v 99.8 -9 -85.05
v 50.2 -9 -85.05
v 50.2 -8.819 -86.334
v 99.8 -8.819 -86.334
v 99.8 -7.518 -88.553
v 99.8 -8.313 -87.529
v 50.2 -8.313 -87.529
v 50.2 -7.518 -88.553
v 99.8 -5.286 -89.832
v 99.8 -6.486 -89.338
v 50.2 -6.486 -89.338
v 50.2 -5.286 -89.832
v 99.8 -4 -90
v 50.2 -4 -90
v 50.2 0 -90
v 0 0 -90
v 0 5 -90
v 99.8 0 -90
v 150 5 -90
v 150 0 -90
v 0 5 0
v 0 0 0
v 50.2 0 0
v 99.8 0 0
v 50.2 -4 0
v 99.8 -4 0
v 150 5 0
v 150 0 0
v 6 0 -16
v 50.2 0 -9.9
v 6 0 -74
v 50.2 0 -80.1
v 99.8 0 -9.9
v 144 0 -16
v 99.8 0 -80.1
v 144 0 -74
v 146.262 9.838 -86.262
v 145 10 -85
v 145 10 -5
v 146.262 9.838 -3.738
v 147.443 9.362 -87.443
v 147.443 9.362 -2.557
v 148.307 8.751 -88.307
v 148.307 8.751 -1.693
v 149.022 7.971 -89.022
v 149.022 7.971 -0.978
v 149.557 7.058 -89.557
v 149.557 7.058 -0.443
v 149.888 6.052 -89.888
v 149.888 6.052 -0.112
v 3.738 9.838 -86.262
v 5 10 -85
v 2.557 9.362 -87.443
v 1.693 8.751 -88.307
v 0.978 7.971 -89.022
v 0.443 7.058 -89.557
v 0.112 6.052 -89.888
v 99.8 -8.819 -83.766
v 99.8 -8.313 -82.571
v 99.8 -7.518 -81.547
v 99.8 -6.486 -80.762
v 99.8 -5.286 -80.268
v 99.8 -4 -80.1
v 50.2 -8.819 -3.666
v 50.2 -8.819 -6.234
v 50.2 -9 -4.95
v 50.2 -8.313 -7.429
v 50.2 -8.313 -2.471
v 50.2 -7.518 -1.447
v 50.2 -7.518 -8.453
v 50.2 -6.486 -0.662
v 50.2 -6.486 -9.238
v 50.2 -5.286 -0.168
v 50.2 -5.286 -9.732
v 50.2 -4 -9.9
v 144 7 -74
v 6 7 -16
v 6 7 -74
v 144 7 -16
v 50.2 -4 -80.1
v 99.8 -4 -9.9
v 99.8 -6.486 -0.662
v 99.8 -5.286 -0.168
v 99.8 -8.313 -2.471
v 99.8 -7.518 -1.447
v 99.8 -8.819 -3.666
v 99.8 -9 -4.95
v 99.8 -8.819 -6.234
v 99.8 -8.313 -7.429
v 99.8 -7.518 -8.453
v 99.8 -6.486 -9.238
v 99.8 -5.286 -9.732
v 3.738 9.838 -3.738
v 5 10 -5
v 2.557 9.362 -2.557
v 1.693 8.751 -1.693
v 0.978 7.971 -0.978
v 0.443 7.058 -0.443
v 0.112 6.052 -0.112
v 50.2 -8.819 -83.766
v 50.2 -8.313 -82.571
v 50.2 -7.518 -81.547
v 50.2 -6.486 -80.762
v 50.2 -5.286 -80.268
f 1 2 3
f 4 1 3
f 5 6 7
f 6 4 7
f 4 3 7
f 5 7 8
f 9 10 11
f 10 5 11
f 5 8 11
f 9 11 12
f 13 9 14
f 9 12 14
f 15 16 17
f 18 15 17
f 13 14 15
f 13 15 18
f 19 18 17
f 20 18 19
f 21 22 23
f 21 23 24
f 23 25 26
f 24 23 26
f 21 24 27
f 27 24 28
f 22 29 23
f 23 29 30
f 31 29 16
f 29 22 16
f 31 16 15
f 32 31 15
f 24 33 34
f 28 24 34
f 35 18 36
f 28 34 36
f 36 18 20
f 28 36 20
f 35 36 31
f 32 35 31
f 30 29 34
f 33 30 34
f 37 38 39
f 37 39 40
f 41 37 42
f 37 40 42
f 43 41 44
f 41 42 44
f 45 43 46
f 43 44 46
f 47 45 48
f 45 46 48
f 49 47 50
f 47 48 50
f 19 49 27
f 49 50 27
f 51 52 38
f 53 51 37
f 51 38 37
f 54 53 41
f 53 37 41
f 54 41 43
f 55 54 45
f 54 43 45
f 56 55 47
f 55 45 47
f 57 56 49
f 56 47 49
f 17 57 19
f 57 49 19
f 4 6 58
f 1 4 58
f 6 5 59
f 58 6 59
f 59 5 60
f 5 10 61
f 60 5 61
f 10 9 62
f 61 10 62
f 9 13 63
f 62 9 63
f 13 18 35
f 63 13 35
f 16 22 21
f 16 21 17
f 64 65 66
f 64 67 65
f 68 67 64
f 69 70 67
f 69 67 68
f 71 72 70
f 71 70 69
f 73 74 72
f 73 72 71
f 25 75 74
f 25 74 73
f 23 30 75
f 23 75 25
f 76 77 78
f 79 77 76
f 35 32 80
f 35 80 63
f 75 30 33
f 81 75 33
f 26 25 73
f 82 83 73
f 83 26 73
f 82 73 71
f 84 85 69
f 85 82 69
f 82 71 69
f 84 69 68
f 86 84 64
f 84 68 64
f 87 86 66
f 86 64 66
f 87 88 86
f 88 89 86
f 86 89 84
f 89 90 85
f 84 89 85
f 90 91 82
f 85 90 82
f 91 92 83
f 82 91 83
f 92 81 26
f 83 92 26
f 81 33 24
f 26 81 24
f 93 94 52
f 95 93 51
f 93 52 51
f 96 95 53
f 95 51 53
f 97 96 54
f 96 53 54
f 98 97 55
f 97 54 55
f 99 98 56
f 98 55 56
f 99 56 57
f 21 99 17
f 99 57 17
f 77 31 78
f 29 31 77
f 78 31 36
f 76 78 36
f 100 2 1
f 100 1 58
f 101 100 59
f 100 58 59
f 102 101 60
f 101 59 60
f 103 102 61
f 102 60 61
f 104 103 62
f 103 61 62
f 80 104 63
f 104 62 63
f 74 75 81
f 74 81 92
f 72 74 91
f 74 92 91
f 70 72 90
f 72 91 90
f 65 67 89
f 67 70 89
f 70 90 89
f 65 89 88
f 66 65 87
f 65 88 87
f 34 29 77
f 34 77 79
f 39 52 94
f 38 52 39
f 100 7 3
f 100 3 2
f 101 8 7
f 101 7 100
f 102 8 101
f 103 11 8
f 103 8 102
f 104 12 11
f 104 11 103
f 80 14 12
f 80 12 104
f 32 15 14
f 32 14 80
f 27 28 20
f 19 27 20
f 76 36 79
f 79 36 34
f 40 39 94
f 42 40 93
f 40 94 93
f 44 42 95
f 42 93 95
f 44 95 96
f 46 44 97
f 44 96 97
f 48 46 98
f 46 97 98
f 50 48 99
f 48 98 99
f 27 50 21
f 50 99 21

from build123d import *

# Parameters (mm, degrees)
SKETCH1_W           = 150
SKETCH1_H           = 90
BOSS_EXTRUDE1_DEPTH = 10
SKETCH2_W           = 49.6
SKETCH2_H           = 9.9
BOSS_EXTRUDE2_DEPTH = 9
SKETCH4_W           = 138
SKETCH4_H           = 58
CUT_EXTRUDE1_DEPTH  = 7
FILLET1_R           = 5


with BuildPart() as part:
    # Sketch1 → Boss-Extrude1 (new body)
    with BuildSketch(Plane(origin=(0, 0, 0), x_dir=(1, 0, 0), z_dir=(0, 1, 0))):
        with Locations((75, 45)):
            Rectangle(SKETCH1_W, SKETCH1_H)
    extrude(amount=BOSS_EXTRUDE1_DEPTH)

    # Sketch2 → Boss-Extrude2 (add)
    with BuildSketch(Plane.XZ):
        with Locations((75, -4.95)):
            Rectangle(SKETCH2_W, SKETCH2_H)
        with Locations((75, -85.05)):
            Rectangle(SKETCH2_W, SKETCH2_H)
    extrude(amount=BOSS_EXTRUDE2_DEPTH)

    # Sketch4 → Cut-Extrude1 (cut)
    with BuildSketch(Plane.XZ):
        with Locations((75, -45)):
            Rectangle(SKETCH4_W, SKETCH4_H)
    extrude(amount=-CUT_EXTRUDE1_DEPTH, mode=Mode.SUBTRACT)

    # Fillet1
    # the kernel refuses this fillet: 5 mm, written as the material it takes off along each edge
    with BuildSketch(Plane(origin=(112.3, -9, -80.1), x_dir=(0, 1, 0), z_dir=(-1, 0, 0)), Plane(origin=(37.7, -9, -90), x_dir=(0, 1, 0), z_dir=(1, 0, 0)), Plane(origin=(112.3, -9, -9.9), x_dir=(0, 0, 1), z_dir=(-1, 0, 0))) as fillet1_piece_1:
        with BuildLine():
            CenterArc((FILLET1_R, FILLET1_R), FILLET1_R, 180, 90)
            Line((0, FILLET1_R), (0, 0))
            Line((0, 0), (FILLET1_R, 0))
        make_face()
    extrude(amount=74.6, mode=Mode.SUBTRACT)
    with BuildSketch(Plane(origin=(37.7, -9, 0), x_dir=(0, 1, 0), z_dir=(1, 0, 0))) as fillet1_piece_2:
        with BuildLine():
            CenterArc((FILLET1_R, -FILLET1_R), FILLET1_R, 90, 90)
            Line((0, -FILLET1_R), (0, 0))
            Line((0, 0), (FILLET1_R, 0))
        make_face()
    extrude(amount=74.6, mode=Mode.SUBTRACT)
    with BuildSketch(Plane(origin=(150, 10, 12.5), x_dir=(-1, 0, 0), z_dir=(0, 0, -1))) as fillet1_piece_3:
        with BuildLine():
            CenterArc((FILLET1_R, -FILLET1_R), FILLET1_R, 90, 90)
            Line((0, -FILLET1_R), (0, 0))
            Line((0, 0), (FILLET1_R, 0))
        make_face()
    extrude(amount=115, mode=Mode.SUBTRACT)
    with BuildSketch(Plane(origin=(162.5, 10, -90), x_dir=(0, 0, 1), z_dir=(-1, 0, 0))) as fillet1_piece_4:
        with BuildLine():
            CenterArc((FILLET1_R, -FILLET1_R), FILLET1_R, 90, 90)
            Line((0, -FILLET1_R), (0, 0))
            Line((0, 0), (FILLET1_R, 0))
        make_face()
    extrude(amount=175, mode=Mode.SUBTRACT)
    with BuildSketch(Plane(origin=(-12.5, 10, 0), x_dir=(0, -1, 0), z_dir=(1, 0, 0))) as fillet1_piece_5:
        with BuildLine():
            CenterArc((FILLET1_R, FILLET1_R), FILLET1_R, 180, 90)
            Line((0, FILLET1_R), (0, 0))
            Line((0, 0), (FILLET1_R, 0))
        make_face()
    extrude(amount=175, mode=Mode.SUBTRACT)
    with BuildSketch(Plane(origin=(0, 10, -102.5), x_dir=(0, -1, 0), z_dir=(0, 0, 1))) as fillet1_piece_6:
        with BuildLine():
            CenterArc((FILLET1_R, FILLET1_R), FILLET1_R, 180, 90)
            Line((0, FILLET1_R), (0, 0))
            Line((0, 0), (FILLET1_R, 0))
        make_face()
    extrude(amount=115, mode=Mode.SUBTRACT)


solid = part.part
